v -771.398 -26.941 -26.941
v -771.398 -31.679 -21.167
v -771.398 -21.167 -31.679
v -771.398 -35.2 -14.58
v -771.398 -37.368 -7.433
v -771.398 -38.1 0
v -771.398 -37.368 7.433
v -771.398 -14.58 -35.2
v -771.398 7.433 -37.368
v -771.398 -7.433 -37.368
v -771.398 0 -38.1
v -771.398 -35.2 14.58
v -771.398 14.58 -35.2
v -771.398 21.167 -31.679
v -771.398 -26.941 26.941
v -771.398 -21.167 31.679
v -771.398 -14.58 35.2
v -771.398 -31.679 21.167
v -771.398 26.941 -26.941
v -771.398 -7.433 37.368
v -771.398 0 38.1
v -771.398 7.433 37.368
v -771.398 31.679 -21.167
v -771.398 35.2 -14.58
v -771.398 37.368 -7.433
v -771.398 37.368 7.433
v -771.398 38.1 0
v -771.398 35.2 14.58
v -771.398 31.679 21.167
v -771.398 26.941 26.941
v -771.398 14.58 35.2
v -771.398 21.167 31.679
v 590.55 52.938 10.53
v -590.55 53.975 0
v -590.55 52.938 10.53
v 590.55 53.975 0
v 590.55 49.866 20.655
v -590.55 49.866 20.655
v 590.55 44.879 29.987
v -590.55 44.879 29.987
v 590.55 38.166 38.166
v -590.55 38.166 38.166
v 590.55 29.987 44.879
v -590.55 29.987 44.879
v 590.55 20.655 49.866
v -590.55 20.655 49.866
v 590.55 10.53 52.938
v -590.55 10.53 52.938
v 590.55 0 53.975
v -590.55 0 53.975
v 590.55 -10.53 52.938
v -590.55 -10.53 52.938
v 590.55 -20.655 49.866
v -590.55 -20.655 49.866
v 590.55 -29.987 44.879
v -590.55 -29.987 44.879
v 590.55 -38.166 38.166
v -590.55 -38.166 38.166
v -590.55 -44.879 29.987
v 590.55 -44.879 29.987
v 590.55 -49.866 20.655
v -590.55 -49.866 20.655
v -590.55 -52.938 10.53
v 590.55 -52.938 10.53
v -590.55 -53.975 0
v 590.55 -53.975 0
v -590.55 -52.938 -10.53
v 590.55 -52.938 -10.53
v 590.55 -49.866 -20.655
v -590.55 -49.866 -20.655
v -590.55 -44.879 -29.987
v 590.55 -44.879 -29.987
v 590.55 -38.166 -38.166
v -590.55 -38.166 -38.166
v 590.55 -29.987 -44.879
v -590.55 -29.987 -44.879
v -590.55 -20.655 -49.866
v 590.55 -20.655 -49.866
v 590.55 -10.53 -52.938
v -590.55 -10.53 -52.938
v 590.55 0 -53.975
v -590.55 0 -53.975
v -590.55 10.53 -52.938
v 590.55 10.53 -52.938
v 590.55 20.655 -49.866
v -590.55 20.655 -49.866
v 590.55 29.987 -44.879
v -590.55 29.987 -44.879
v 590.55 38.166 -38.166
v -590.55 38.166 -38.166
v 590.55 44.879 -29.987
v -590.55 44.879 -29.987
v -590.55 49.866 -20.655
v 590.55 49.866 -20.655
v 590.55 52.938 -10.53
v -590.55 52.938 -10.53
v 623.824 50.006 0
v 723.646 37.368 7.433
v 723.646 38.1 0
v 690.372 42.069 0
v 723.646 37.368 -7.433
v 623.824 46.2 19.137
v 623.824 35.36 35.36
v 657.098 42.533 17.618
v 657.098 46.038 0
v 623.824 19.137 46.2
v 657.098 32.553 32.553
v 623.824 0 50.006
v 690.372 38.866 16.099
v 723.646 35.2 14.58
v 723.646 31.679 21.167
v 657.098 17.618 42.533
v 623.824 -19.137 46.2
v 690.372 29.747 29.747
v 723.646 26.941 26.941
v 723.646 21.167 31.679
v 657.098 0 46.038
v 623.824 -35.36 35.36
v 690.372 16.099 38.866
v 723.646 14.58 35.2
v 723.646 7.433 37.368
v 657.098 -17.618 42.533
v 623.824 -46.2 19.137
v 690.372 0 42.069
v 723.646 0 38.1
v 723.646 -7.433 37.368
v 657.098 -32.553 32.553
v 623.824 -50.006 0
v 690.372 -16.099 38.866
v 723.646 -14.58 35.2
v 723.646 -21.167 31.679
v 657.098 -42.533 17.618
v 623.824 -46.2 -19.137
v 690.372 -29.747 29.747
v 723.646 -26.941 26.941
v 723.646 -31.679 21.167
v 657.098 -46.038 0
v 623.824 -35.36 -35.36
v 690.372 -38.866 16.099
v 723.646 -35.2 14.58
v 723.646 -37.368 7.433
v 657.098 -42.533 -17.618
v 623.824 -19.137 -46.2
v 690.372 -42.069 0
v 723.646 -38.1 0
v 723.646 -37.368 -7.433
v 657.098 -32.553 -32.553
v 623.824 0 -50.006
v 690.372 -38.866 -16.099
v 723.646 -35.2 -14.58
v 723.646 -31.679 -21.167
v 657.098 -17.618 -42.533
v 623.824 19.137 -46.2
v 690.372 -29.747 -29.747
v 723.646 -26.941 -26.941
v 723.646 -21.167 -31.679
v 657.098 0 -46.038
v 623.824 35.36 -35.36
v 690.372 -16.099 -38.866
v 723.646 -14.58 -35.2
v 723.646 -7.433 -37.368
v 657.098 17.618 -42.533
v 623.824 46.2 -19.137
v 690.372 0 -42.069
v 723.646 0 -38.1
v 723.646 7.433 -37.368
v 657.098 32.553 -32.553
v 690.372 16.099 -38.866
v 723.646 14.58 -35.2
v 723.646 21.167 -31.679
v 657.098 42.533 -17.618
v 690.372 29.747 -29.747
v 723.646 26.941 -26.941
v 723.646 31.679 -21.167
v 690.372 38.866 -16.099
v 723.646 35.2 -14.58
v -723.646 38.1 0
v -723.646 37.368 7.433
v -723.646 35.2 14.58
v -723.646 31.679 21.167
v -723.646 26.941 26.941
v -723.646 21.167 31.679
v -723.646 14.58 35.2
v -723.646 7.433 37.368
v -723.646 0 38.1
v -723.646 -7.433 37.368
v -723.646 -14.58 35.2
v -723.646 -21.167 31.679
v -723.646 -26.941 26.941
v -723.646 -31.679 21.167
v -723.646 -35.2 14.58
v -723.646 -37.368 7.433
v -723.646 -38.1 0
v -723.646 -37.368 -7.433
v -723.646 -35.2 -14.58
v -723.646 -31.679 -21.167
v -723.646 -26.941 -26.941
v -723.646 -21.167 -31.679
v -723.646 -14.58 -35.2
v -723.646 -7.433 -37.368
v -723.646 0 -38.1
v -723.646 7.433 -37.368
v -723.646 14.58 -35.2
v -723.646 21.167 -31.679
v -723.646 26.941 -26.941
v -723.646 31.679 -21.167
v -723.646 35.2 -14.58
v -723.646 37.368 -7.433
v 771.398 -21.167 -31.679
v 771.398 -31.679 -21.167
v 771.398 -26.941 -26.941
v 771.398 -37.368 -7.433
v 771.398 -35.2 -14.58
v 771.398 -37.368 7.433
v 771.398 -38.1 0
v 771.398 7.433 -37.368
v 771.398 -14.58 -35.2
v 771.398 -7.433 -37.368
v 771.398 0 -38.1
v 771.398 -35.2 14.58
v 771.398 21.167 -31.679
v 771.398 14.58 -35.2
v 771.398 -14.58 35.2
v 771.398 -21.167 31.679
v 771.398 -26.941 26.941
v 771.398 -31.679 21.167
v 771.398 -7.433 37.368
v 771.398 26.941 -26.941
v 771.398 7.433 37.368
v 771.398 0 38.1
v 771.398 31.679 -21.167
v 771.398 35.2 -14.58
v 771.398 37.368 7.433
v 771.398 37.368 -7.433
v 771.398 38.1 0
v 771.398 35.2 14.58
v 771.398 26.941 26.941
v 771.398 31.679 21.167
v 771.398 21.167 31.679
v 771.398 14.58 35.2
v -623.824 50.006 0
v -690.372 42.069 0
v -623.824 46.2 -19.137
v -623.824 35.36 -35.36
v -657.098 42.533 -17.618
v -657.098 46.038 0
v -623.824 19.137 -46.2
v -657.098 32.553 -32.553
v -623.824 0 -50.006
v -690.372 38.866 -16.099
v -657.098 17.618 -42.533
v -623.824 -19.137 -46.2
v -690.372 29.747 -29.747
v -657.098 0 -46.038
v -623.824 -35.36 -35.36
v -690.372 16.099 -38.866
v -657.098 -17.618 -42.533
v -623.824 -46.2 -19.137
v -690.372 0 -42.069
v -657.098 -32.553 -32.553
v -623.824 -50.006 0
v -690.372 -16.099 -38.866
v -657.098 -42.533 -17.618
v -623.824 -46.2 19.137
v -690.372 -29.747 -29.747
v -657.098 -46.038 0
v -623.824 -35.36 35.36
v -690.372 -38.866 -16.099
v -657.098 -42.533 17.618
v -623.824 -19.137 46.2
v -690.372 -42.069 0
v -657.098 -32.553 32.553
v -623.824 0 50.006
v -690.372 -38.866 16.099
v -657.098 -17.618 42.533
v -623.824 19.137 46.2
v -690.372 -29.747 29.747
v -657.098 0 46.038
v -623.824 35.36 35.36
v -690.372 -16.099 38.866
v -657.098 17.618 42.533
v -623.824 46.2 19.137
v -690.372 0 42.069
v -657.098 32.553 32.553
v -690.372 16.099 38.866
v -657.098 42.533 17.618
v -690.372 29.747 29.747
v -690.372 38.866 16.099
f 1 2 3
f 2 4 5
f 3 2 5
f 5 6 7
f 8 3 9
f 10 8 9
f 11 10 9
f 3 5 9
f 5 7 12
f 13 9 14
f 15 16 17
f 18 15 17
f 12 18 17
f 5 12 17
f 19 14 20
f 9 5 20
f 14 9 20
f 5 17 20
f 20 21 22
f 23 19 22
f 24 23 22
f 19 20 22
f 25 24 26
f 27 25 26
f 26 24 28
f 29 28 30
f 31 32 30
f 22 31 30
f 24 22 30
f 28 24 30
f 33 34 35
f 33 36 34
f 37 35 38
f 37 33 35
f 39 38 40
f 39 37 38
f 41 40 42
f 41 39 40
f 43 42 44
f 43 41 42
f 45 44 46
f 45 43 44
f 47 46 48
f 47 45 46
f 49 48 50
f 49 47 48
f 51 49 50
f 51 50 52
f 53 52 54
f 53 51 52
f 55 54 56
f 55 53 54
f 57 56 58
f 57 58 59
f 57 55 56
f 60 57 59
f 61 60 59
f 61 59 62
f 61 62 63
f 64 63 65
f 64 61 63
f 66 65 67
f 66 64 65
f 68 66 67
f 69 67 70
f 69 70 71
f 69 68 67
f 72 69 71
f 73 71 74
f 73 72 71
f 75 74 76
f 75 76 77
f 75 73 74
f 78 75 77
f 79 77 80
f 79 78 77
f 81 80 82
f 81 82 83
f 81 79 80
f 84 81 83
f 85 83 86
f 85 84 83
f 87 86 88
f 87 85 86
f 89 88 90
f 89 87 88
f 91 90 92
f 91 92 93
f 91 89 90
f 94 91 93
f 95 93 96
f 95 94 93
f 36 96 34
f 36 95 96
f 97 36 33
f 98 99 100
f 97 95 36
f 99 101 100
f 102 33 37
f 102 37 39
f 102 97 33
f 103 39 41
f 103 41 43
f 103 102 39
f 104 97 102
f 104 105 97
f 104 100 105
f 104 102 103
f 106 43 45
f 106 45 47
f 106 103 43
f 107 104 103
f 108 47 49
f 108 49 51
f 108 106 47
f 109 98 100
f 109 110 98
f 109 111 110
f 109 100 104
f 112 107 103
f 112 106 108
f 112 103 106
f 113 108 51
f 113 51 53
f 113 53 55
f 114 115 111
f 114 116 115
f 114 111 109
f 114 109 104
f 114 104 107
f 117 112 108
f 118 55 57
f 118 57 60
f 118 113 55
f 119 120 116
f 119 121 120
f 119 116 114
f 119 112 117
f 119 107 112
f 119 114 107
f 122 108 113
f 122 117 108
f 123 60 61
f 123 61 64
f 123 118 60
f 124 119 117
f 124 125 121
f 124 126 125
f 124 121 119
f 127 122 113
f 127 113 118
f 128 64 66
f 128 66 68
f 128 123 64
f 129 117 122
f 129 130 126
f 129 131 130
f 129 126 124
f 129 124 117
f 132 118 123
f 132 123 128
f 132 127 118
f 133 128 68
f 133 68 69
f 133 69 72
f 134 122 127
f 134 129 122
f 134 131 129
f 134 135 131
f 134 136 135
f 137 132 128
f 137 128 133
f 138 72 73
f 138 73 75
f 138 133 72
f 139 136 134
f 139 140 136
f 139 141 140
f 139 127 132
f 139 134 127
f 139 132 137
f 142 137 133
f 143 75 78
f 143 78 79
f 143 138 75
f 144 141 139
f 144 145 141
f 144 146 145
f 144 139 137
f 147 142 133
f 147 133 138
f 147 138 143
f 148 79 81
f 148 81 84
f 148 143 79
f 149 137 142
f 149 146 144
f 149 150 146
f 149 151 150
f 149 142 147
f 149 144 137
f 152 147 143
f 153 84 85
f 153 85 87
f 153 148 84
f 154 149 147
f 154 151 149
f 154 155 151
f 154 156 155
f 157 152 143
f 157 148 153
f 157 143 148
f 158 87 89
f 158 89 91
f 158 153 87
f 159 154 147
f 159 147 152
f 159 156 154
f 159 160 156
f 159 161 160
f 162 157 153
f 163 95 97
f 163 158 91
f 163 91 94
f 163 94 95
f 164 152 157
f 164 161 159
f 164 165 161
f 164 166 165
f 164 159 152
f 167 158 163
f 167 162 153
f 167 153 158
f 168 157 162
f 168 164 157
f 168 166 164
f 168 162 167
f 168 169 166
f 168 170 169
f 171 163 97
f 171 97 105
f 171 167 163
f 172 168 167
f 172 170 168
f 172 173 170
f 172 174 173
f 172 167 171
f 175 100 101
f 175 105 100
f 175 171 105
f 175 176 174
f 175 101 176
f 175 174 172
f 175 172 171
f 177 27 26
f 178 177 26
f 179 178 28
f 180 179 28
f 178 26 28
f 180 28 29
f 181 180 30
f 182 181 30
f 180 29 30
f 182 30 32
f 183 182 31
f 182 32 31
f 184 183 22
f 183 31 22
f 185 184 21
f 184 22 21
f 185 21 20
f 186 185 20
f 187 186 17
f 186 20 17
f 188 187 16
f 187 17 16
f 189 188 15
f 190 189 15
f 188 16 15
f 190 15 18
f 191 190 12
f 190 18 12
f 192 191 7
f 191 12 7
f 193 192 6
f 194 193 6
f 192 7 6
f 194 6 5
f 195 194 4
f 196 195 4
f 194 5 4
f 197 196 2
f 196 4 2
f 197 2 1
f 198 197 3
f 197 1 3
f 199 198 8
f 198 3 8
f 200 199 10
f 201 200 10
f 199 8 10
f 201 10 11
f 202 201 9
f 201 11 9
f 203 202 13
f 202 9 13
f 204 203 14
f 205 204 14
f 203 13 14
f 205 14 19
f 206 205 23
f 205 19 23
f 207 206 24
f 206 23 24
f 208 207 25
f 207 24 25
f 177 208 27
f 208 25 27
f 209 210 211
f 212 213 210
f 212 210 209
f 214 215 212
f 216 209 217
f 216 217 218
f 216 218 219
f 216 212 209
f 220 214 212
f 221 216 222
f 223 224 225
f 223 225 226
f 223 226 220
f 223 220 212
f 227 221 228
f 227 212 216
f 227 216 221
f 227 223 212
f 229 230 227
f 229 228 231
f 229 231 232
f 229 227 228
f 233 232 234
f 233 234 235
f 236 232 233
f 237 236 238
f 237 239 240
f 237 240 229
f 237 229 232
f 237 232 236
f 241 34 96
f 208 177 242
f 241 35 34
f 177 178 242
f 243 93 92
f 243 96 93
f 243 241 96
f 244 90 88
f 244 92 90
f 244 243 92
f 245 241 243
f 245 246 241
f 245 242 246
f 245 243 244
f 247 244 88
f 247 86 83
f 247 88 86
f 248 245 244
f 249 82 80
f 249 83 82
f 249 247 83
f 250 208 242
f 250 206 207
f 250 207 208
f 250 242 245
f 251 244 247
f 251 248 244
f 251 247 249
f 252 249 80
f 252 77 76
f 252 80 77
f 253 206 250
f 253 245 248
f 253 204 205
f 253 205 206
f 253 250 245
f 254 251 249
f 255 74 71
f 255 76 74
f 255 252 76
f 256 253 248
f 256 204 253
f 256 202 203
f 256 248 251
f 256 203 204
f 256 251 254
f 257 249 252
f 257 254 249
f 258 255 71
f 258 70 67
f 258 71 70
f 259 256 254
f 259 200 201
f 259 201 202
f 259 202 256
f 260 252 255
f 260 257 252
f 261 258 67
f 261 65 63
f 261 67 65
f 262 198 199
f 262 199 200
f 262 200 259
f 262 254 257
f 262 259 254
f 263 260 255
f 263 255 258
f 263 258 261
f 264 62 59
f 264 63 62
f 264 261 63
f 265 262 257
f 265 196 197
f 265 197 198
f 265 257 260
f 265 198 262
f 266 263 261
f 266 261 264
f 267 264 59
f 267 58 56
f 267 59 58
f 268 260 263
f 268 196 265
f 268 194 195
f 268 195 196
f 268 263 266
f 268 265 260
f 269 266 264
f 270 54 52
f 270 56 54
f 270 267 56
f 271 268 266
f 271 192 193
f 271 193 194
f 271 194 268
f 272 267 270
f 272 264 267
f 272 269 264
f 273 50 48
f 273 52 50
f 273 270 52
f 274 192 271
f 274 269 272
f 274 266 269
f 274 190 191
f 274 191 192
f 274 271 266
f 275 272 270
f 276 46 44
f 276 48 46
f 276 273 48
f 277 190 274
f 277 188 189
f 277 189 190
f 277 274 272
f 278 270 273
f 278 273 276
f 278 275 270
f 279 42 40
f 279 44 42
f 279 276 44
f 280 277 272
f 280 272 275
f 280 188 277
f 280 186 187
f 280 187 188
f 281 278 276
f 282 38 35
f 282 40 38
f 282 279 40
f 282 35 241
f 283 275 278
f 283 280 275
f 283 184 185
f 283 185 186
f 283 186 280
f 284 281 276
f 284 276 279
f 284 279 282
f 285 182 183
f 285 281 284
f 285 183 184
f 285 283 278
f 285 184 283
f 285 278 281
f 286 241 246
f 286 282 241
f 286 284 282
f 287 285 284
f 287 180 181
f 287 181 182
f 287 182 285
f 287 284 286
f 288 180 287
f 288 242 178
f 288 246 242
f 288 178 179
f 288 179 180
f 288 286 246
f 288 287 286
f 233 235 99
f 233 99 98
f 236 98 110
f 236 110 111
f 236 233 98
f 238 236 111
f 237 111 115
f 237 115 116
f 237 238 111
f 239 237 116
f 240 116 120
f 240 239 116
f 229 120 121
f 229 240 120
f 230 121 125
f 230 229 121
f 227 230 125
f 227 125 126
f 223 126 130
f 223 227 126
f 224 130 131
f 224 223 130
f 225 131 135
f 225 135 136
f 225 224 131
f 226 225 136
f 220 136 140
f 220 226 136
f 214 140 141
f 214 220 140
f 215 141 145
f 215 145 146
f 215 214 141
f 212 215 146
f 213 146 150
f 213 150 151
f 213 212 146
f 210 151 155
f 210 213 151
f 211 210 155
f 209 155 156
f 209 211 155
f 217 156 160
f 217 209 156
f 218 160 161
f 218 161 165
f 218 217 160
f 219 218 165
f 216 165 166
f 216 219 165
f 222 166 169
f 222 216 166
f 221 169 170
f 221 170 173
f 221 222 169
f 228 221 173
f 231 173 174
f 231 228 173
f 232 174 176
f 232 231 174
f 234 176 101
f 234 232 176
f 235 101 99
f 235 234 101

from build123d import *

# Parameters (mm, degrees)
F0_R       = 53.975
F1_DEPTH   = 590.55
F3_R       = 38.1
F4_DEPTH   = 47.752
F1_FACE_R  = 53.975
F4_FACE_R  = 38.1
F1_FACE1_R = 53.975
F5_FACE_R  = 38.1


with BuildPart() as f1:
    # F0 (on Right) → F1 (new body, symmetric)
    with BuildSketch(Plane.YZ):
        Circle(F0_R)
    extrude(amount=F1_DEPTH, both=True)



with BuildPart() as f4:
    # F3 (on offset) → F4 (new body)
    with BuildSketch(Plane.YZ.offset(771.398)):
        Circle(F3_R)
    extrude(amount=-F4_DEPTH)


with BuildPart() as f5_1:
    # F5: instance of F4
    add(f4.part.mirror(Plane.YZ))


with BuildPart() as f1_1:
    add(f1.part)

    add(f4.part)  # F6 merges F4
    # F1_face (on face) → F6 section 0
    with BuildSketch(Plane.YZ.offset(590.55)):
        Circle(F1_FACE_R)
    # F4_face (on face) → F6 section 1
    with BuildSketch(Plane(origin=(723.646, 0, 0), x_dir=(0, 1, 0), z_dir=(-1, 0, 0))):
        Circle(F4_FACE_R)
    loft()


    add(f5_1.part)  # F7 merges F5_1
    # F1_face1 (on face) → F7 section 0
    with BuildSketch(Plane(origin=(-590.55, 0, 0), x_dir=(0, 1, 0), z_dir=(-1, 0, 0))):
        Circle(F1_FACE1_R)
    # F5_face (on face) → F7 section 1
    with BuildSketch(Plane.YZ.offset(-723.646)):
        Circle(F5_FACE_R)
    loft()


solid = f1_1.part
